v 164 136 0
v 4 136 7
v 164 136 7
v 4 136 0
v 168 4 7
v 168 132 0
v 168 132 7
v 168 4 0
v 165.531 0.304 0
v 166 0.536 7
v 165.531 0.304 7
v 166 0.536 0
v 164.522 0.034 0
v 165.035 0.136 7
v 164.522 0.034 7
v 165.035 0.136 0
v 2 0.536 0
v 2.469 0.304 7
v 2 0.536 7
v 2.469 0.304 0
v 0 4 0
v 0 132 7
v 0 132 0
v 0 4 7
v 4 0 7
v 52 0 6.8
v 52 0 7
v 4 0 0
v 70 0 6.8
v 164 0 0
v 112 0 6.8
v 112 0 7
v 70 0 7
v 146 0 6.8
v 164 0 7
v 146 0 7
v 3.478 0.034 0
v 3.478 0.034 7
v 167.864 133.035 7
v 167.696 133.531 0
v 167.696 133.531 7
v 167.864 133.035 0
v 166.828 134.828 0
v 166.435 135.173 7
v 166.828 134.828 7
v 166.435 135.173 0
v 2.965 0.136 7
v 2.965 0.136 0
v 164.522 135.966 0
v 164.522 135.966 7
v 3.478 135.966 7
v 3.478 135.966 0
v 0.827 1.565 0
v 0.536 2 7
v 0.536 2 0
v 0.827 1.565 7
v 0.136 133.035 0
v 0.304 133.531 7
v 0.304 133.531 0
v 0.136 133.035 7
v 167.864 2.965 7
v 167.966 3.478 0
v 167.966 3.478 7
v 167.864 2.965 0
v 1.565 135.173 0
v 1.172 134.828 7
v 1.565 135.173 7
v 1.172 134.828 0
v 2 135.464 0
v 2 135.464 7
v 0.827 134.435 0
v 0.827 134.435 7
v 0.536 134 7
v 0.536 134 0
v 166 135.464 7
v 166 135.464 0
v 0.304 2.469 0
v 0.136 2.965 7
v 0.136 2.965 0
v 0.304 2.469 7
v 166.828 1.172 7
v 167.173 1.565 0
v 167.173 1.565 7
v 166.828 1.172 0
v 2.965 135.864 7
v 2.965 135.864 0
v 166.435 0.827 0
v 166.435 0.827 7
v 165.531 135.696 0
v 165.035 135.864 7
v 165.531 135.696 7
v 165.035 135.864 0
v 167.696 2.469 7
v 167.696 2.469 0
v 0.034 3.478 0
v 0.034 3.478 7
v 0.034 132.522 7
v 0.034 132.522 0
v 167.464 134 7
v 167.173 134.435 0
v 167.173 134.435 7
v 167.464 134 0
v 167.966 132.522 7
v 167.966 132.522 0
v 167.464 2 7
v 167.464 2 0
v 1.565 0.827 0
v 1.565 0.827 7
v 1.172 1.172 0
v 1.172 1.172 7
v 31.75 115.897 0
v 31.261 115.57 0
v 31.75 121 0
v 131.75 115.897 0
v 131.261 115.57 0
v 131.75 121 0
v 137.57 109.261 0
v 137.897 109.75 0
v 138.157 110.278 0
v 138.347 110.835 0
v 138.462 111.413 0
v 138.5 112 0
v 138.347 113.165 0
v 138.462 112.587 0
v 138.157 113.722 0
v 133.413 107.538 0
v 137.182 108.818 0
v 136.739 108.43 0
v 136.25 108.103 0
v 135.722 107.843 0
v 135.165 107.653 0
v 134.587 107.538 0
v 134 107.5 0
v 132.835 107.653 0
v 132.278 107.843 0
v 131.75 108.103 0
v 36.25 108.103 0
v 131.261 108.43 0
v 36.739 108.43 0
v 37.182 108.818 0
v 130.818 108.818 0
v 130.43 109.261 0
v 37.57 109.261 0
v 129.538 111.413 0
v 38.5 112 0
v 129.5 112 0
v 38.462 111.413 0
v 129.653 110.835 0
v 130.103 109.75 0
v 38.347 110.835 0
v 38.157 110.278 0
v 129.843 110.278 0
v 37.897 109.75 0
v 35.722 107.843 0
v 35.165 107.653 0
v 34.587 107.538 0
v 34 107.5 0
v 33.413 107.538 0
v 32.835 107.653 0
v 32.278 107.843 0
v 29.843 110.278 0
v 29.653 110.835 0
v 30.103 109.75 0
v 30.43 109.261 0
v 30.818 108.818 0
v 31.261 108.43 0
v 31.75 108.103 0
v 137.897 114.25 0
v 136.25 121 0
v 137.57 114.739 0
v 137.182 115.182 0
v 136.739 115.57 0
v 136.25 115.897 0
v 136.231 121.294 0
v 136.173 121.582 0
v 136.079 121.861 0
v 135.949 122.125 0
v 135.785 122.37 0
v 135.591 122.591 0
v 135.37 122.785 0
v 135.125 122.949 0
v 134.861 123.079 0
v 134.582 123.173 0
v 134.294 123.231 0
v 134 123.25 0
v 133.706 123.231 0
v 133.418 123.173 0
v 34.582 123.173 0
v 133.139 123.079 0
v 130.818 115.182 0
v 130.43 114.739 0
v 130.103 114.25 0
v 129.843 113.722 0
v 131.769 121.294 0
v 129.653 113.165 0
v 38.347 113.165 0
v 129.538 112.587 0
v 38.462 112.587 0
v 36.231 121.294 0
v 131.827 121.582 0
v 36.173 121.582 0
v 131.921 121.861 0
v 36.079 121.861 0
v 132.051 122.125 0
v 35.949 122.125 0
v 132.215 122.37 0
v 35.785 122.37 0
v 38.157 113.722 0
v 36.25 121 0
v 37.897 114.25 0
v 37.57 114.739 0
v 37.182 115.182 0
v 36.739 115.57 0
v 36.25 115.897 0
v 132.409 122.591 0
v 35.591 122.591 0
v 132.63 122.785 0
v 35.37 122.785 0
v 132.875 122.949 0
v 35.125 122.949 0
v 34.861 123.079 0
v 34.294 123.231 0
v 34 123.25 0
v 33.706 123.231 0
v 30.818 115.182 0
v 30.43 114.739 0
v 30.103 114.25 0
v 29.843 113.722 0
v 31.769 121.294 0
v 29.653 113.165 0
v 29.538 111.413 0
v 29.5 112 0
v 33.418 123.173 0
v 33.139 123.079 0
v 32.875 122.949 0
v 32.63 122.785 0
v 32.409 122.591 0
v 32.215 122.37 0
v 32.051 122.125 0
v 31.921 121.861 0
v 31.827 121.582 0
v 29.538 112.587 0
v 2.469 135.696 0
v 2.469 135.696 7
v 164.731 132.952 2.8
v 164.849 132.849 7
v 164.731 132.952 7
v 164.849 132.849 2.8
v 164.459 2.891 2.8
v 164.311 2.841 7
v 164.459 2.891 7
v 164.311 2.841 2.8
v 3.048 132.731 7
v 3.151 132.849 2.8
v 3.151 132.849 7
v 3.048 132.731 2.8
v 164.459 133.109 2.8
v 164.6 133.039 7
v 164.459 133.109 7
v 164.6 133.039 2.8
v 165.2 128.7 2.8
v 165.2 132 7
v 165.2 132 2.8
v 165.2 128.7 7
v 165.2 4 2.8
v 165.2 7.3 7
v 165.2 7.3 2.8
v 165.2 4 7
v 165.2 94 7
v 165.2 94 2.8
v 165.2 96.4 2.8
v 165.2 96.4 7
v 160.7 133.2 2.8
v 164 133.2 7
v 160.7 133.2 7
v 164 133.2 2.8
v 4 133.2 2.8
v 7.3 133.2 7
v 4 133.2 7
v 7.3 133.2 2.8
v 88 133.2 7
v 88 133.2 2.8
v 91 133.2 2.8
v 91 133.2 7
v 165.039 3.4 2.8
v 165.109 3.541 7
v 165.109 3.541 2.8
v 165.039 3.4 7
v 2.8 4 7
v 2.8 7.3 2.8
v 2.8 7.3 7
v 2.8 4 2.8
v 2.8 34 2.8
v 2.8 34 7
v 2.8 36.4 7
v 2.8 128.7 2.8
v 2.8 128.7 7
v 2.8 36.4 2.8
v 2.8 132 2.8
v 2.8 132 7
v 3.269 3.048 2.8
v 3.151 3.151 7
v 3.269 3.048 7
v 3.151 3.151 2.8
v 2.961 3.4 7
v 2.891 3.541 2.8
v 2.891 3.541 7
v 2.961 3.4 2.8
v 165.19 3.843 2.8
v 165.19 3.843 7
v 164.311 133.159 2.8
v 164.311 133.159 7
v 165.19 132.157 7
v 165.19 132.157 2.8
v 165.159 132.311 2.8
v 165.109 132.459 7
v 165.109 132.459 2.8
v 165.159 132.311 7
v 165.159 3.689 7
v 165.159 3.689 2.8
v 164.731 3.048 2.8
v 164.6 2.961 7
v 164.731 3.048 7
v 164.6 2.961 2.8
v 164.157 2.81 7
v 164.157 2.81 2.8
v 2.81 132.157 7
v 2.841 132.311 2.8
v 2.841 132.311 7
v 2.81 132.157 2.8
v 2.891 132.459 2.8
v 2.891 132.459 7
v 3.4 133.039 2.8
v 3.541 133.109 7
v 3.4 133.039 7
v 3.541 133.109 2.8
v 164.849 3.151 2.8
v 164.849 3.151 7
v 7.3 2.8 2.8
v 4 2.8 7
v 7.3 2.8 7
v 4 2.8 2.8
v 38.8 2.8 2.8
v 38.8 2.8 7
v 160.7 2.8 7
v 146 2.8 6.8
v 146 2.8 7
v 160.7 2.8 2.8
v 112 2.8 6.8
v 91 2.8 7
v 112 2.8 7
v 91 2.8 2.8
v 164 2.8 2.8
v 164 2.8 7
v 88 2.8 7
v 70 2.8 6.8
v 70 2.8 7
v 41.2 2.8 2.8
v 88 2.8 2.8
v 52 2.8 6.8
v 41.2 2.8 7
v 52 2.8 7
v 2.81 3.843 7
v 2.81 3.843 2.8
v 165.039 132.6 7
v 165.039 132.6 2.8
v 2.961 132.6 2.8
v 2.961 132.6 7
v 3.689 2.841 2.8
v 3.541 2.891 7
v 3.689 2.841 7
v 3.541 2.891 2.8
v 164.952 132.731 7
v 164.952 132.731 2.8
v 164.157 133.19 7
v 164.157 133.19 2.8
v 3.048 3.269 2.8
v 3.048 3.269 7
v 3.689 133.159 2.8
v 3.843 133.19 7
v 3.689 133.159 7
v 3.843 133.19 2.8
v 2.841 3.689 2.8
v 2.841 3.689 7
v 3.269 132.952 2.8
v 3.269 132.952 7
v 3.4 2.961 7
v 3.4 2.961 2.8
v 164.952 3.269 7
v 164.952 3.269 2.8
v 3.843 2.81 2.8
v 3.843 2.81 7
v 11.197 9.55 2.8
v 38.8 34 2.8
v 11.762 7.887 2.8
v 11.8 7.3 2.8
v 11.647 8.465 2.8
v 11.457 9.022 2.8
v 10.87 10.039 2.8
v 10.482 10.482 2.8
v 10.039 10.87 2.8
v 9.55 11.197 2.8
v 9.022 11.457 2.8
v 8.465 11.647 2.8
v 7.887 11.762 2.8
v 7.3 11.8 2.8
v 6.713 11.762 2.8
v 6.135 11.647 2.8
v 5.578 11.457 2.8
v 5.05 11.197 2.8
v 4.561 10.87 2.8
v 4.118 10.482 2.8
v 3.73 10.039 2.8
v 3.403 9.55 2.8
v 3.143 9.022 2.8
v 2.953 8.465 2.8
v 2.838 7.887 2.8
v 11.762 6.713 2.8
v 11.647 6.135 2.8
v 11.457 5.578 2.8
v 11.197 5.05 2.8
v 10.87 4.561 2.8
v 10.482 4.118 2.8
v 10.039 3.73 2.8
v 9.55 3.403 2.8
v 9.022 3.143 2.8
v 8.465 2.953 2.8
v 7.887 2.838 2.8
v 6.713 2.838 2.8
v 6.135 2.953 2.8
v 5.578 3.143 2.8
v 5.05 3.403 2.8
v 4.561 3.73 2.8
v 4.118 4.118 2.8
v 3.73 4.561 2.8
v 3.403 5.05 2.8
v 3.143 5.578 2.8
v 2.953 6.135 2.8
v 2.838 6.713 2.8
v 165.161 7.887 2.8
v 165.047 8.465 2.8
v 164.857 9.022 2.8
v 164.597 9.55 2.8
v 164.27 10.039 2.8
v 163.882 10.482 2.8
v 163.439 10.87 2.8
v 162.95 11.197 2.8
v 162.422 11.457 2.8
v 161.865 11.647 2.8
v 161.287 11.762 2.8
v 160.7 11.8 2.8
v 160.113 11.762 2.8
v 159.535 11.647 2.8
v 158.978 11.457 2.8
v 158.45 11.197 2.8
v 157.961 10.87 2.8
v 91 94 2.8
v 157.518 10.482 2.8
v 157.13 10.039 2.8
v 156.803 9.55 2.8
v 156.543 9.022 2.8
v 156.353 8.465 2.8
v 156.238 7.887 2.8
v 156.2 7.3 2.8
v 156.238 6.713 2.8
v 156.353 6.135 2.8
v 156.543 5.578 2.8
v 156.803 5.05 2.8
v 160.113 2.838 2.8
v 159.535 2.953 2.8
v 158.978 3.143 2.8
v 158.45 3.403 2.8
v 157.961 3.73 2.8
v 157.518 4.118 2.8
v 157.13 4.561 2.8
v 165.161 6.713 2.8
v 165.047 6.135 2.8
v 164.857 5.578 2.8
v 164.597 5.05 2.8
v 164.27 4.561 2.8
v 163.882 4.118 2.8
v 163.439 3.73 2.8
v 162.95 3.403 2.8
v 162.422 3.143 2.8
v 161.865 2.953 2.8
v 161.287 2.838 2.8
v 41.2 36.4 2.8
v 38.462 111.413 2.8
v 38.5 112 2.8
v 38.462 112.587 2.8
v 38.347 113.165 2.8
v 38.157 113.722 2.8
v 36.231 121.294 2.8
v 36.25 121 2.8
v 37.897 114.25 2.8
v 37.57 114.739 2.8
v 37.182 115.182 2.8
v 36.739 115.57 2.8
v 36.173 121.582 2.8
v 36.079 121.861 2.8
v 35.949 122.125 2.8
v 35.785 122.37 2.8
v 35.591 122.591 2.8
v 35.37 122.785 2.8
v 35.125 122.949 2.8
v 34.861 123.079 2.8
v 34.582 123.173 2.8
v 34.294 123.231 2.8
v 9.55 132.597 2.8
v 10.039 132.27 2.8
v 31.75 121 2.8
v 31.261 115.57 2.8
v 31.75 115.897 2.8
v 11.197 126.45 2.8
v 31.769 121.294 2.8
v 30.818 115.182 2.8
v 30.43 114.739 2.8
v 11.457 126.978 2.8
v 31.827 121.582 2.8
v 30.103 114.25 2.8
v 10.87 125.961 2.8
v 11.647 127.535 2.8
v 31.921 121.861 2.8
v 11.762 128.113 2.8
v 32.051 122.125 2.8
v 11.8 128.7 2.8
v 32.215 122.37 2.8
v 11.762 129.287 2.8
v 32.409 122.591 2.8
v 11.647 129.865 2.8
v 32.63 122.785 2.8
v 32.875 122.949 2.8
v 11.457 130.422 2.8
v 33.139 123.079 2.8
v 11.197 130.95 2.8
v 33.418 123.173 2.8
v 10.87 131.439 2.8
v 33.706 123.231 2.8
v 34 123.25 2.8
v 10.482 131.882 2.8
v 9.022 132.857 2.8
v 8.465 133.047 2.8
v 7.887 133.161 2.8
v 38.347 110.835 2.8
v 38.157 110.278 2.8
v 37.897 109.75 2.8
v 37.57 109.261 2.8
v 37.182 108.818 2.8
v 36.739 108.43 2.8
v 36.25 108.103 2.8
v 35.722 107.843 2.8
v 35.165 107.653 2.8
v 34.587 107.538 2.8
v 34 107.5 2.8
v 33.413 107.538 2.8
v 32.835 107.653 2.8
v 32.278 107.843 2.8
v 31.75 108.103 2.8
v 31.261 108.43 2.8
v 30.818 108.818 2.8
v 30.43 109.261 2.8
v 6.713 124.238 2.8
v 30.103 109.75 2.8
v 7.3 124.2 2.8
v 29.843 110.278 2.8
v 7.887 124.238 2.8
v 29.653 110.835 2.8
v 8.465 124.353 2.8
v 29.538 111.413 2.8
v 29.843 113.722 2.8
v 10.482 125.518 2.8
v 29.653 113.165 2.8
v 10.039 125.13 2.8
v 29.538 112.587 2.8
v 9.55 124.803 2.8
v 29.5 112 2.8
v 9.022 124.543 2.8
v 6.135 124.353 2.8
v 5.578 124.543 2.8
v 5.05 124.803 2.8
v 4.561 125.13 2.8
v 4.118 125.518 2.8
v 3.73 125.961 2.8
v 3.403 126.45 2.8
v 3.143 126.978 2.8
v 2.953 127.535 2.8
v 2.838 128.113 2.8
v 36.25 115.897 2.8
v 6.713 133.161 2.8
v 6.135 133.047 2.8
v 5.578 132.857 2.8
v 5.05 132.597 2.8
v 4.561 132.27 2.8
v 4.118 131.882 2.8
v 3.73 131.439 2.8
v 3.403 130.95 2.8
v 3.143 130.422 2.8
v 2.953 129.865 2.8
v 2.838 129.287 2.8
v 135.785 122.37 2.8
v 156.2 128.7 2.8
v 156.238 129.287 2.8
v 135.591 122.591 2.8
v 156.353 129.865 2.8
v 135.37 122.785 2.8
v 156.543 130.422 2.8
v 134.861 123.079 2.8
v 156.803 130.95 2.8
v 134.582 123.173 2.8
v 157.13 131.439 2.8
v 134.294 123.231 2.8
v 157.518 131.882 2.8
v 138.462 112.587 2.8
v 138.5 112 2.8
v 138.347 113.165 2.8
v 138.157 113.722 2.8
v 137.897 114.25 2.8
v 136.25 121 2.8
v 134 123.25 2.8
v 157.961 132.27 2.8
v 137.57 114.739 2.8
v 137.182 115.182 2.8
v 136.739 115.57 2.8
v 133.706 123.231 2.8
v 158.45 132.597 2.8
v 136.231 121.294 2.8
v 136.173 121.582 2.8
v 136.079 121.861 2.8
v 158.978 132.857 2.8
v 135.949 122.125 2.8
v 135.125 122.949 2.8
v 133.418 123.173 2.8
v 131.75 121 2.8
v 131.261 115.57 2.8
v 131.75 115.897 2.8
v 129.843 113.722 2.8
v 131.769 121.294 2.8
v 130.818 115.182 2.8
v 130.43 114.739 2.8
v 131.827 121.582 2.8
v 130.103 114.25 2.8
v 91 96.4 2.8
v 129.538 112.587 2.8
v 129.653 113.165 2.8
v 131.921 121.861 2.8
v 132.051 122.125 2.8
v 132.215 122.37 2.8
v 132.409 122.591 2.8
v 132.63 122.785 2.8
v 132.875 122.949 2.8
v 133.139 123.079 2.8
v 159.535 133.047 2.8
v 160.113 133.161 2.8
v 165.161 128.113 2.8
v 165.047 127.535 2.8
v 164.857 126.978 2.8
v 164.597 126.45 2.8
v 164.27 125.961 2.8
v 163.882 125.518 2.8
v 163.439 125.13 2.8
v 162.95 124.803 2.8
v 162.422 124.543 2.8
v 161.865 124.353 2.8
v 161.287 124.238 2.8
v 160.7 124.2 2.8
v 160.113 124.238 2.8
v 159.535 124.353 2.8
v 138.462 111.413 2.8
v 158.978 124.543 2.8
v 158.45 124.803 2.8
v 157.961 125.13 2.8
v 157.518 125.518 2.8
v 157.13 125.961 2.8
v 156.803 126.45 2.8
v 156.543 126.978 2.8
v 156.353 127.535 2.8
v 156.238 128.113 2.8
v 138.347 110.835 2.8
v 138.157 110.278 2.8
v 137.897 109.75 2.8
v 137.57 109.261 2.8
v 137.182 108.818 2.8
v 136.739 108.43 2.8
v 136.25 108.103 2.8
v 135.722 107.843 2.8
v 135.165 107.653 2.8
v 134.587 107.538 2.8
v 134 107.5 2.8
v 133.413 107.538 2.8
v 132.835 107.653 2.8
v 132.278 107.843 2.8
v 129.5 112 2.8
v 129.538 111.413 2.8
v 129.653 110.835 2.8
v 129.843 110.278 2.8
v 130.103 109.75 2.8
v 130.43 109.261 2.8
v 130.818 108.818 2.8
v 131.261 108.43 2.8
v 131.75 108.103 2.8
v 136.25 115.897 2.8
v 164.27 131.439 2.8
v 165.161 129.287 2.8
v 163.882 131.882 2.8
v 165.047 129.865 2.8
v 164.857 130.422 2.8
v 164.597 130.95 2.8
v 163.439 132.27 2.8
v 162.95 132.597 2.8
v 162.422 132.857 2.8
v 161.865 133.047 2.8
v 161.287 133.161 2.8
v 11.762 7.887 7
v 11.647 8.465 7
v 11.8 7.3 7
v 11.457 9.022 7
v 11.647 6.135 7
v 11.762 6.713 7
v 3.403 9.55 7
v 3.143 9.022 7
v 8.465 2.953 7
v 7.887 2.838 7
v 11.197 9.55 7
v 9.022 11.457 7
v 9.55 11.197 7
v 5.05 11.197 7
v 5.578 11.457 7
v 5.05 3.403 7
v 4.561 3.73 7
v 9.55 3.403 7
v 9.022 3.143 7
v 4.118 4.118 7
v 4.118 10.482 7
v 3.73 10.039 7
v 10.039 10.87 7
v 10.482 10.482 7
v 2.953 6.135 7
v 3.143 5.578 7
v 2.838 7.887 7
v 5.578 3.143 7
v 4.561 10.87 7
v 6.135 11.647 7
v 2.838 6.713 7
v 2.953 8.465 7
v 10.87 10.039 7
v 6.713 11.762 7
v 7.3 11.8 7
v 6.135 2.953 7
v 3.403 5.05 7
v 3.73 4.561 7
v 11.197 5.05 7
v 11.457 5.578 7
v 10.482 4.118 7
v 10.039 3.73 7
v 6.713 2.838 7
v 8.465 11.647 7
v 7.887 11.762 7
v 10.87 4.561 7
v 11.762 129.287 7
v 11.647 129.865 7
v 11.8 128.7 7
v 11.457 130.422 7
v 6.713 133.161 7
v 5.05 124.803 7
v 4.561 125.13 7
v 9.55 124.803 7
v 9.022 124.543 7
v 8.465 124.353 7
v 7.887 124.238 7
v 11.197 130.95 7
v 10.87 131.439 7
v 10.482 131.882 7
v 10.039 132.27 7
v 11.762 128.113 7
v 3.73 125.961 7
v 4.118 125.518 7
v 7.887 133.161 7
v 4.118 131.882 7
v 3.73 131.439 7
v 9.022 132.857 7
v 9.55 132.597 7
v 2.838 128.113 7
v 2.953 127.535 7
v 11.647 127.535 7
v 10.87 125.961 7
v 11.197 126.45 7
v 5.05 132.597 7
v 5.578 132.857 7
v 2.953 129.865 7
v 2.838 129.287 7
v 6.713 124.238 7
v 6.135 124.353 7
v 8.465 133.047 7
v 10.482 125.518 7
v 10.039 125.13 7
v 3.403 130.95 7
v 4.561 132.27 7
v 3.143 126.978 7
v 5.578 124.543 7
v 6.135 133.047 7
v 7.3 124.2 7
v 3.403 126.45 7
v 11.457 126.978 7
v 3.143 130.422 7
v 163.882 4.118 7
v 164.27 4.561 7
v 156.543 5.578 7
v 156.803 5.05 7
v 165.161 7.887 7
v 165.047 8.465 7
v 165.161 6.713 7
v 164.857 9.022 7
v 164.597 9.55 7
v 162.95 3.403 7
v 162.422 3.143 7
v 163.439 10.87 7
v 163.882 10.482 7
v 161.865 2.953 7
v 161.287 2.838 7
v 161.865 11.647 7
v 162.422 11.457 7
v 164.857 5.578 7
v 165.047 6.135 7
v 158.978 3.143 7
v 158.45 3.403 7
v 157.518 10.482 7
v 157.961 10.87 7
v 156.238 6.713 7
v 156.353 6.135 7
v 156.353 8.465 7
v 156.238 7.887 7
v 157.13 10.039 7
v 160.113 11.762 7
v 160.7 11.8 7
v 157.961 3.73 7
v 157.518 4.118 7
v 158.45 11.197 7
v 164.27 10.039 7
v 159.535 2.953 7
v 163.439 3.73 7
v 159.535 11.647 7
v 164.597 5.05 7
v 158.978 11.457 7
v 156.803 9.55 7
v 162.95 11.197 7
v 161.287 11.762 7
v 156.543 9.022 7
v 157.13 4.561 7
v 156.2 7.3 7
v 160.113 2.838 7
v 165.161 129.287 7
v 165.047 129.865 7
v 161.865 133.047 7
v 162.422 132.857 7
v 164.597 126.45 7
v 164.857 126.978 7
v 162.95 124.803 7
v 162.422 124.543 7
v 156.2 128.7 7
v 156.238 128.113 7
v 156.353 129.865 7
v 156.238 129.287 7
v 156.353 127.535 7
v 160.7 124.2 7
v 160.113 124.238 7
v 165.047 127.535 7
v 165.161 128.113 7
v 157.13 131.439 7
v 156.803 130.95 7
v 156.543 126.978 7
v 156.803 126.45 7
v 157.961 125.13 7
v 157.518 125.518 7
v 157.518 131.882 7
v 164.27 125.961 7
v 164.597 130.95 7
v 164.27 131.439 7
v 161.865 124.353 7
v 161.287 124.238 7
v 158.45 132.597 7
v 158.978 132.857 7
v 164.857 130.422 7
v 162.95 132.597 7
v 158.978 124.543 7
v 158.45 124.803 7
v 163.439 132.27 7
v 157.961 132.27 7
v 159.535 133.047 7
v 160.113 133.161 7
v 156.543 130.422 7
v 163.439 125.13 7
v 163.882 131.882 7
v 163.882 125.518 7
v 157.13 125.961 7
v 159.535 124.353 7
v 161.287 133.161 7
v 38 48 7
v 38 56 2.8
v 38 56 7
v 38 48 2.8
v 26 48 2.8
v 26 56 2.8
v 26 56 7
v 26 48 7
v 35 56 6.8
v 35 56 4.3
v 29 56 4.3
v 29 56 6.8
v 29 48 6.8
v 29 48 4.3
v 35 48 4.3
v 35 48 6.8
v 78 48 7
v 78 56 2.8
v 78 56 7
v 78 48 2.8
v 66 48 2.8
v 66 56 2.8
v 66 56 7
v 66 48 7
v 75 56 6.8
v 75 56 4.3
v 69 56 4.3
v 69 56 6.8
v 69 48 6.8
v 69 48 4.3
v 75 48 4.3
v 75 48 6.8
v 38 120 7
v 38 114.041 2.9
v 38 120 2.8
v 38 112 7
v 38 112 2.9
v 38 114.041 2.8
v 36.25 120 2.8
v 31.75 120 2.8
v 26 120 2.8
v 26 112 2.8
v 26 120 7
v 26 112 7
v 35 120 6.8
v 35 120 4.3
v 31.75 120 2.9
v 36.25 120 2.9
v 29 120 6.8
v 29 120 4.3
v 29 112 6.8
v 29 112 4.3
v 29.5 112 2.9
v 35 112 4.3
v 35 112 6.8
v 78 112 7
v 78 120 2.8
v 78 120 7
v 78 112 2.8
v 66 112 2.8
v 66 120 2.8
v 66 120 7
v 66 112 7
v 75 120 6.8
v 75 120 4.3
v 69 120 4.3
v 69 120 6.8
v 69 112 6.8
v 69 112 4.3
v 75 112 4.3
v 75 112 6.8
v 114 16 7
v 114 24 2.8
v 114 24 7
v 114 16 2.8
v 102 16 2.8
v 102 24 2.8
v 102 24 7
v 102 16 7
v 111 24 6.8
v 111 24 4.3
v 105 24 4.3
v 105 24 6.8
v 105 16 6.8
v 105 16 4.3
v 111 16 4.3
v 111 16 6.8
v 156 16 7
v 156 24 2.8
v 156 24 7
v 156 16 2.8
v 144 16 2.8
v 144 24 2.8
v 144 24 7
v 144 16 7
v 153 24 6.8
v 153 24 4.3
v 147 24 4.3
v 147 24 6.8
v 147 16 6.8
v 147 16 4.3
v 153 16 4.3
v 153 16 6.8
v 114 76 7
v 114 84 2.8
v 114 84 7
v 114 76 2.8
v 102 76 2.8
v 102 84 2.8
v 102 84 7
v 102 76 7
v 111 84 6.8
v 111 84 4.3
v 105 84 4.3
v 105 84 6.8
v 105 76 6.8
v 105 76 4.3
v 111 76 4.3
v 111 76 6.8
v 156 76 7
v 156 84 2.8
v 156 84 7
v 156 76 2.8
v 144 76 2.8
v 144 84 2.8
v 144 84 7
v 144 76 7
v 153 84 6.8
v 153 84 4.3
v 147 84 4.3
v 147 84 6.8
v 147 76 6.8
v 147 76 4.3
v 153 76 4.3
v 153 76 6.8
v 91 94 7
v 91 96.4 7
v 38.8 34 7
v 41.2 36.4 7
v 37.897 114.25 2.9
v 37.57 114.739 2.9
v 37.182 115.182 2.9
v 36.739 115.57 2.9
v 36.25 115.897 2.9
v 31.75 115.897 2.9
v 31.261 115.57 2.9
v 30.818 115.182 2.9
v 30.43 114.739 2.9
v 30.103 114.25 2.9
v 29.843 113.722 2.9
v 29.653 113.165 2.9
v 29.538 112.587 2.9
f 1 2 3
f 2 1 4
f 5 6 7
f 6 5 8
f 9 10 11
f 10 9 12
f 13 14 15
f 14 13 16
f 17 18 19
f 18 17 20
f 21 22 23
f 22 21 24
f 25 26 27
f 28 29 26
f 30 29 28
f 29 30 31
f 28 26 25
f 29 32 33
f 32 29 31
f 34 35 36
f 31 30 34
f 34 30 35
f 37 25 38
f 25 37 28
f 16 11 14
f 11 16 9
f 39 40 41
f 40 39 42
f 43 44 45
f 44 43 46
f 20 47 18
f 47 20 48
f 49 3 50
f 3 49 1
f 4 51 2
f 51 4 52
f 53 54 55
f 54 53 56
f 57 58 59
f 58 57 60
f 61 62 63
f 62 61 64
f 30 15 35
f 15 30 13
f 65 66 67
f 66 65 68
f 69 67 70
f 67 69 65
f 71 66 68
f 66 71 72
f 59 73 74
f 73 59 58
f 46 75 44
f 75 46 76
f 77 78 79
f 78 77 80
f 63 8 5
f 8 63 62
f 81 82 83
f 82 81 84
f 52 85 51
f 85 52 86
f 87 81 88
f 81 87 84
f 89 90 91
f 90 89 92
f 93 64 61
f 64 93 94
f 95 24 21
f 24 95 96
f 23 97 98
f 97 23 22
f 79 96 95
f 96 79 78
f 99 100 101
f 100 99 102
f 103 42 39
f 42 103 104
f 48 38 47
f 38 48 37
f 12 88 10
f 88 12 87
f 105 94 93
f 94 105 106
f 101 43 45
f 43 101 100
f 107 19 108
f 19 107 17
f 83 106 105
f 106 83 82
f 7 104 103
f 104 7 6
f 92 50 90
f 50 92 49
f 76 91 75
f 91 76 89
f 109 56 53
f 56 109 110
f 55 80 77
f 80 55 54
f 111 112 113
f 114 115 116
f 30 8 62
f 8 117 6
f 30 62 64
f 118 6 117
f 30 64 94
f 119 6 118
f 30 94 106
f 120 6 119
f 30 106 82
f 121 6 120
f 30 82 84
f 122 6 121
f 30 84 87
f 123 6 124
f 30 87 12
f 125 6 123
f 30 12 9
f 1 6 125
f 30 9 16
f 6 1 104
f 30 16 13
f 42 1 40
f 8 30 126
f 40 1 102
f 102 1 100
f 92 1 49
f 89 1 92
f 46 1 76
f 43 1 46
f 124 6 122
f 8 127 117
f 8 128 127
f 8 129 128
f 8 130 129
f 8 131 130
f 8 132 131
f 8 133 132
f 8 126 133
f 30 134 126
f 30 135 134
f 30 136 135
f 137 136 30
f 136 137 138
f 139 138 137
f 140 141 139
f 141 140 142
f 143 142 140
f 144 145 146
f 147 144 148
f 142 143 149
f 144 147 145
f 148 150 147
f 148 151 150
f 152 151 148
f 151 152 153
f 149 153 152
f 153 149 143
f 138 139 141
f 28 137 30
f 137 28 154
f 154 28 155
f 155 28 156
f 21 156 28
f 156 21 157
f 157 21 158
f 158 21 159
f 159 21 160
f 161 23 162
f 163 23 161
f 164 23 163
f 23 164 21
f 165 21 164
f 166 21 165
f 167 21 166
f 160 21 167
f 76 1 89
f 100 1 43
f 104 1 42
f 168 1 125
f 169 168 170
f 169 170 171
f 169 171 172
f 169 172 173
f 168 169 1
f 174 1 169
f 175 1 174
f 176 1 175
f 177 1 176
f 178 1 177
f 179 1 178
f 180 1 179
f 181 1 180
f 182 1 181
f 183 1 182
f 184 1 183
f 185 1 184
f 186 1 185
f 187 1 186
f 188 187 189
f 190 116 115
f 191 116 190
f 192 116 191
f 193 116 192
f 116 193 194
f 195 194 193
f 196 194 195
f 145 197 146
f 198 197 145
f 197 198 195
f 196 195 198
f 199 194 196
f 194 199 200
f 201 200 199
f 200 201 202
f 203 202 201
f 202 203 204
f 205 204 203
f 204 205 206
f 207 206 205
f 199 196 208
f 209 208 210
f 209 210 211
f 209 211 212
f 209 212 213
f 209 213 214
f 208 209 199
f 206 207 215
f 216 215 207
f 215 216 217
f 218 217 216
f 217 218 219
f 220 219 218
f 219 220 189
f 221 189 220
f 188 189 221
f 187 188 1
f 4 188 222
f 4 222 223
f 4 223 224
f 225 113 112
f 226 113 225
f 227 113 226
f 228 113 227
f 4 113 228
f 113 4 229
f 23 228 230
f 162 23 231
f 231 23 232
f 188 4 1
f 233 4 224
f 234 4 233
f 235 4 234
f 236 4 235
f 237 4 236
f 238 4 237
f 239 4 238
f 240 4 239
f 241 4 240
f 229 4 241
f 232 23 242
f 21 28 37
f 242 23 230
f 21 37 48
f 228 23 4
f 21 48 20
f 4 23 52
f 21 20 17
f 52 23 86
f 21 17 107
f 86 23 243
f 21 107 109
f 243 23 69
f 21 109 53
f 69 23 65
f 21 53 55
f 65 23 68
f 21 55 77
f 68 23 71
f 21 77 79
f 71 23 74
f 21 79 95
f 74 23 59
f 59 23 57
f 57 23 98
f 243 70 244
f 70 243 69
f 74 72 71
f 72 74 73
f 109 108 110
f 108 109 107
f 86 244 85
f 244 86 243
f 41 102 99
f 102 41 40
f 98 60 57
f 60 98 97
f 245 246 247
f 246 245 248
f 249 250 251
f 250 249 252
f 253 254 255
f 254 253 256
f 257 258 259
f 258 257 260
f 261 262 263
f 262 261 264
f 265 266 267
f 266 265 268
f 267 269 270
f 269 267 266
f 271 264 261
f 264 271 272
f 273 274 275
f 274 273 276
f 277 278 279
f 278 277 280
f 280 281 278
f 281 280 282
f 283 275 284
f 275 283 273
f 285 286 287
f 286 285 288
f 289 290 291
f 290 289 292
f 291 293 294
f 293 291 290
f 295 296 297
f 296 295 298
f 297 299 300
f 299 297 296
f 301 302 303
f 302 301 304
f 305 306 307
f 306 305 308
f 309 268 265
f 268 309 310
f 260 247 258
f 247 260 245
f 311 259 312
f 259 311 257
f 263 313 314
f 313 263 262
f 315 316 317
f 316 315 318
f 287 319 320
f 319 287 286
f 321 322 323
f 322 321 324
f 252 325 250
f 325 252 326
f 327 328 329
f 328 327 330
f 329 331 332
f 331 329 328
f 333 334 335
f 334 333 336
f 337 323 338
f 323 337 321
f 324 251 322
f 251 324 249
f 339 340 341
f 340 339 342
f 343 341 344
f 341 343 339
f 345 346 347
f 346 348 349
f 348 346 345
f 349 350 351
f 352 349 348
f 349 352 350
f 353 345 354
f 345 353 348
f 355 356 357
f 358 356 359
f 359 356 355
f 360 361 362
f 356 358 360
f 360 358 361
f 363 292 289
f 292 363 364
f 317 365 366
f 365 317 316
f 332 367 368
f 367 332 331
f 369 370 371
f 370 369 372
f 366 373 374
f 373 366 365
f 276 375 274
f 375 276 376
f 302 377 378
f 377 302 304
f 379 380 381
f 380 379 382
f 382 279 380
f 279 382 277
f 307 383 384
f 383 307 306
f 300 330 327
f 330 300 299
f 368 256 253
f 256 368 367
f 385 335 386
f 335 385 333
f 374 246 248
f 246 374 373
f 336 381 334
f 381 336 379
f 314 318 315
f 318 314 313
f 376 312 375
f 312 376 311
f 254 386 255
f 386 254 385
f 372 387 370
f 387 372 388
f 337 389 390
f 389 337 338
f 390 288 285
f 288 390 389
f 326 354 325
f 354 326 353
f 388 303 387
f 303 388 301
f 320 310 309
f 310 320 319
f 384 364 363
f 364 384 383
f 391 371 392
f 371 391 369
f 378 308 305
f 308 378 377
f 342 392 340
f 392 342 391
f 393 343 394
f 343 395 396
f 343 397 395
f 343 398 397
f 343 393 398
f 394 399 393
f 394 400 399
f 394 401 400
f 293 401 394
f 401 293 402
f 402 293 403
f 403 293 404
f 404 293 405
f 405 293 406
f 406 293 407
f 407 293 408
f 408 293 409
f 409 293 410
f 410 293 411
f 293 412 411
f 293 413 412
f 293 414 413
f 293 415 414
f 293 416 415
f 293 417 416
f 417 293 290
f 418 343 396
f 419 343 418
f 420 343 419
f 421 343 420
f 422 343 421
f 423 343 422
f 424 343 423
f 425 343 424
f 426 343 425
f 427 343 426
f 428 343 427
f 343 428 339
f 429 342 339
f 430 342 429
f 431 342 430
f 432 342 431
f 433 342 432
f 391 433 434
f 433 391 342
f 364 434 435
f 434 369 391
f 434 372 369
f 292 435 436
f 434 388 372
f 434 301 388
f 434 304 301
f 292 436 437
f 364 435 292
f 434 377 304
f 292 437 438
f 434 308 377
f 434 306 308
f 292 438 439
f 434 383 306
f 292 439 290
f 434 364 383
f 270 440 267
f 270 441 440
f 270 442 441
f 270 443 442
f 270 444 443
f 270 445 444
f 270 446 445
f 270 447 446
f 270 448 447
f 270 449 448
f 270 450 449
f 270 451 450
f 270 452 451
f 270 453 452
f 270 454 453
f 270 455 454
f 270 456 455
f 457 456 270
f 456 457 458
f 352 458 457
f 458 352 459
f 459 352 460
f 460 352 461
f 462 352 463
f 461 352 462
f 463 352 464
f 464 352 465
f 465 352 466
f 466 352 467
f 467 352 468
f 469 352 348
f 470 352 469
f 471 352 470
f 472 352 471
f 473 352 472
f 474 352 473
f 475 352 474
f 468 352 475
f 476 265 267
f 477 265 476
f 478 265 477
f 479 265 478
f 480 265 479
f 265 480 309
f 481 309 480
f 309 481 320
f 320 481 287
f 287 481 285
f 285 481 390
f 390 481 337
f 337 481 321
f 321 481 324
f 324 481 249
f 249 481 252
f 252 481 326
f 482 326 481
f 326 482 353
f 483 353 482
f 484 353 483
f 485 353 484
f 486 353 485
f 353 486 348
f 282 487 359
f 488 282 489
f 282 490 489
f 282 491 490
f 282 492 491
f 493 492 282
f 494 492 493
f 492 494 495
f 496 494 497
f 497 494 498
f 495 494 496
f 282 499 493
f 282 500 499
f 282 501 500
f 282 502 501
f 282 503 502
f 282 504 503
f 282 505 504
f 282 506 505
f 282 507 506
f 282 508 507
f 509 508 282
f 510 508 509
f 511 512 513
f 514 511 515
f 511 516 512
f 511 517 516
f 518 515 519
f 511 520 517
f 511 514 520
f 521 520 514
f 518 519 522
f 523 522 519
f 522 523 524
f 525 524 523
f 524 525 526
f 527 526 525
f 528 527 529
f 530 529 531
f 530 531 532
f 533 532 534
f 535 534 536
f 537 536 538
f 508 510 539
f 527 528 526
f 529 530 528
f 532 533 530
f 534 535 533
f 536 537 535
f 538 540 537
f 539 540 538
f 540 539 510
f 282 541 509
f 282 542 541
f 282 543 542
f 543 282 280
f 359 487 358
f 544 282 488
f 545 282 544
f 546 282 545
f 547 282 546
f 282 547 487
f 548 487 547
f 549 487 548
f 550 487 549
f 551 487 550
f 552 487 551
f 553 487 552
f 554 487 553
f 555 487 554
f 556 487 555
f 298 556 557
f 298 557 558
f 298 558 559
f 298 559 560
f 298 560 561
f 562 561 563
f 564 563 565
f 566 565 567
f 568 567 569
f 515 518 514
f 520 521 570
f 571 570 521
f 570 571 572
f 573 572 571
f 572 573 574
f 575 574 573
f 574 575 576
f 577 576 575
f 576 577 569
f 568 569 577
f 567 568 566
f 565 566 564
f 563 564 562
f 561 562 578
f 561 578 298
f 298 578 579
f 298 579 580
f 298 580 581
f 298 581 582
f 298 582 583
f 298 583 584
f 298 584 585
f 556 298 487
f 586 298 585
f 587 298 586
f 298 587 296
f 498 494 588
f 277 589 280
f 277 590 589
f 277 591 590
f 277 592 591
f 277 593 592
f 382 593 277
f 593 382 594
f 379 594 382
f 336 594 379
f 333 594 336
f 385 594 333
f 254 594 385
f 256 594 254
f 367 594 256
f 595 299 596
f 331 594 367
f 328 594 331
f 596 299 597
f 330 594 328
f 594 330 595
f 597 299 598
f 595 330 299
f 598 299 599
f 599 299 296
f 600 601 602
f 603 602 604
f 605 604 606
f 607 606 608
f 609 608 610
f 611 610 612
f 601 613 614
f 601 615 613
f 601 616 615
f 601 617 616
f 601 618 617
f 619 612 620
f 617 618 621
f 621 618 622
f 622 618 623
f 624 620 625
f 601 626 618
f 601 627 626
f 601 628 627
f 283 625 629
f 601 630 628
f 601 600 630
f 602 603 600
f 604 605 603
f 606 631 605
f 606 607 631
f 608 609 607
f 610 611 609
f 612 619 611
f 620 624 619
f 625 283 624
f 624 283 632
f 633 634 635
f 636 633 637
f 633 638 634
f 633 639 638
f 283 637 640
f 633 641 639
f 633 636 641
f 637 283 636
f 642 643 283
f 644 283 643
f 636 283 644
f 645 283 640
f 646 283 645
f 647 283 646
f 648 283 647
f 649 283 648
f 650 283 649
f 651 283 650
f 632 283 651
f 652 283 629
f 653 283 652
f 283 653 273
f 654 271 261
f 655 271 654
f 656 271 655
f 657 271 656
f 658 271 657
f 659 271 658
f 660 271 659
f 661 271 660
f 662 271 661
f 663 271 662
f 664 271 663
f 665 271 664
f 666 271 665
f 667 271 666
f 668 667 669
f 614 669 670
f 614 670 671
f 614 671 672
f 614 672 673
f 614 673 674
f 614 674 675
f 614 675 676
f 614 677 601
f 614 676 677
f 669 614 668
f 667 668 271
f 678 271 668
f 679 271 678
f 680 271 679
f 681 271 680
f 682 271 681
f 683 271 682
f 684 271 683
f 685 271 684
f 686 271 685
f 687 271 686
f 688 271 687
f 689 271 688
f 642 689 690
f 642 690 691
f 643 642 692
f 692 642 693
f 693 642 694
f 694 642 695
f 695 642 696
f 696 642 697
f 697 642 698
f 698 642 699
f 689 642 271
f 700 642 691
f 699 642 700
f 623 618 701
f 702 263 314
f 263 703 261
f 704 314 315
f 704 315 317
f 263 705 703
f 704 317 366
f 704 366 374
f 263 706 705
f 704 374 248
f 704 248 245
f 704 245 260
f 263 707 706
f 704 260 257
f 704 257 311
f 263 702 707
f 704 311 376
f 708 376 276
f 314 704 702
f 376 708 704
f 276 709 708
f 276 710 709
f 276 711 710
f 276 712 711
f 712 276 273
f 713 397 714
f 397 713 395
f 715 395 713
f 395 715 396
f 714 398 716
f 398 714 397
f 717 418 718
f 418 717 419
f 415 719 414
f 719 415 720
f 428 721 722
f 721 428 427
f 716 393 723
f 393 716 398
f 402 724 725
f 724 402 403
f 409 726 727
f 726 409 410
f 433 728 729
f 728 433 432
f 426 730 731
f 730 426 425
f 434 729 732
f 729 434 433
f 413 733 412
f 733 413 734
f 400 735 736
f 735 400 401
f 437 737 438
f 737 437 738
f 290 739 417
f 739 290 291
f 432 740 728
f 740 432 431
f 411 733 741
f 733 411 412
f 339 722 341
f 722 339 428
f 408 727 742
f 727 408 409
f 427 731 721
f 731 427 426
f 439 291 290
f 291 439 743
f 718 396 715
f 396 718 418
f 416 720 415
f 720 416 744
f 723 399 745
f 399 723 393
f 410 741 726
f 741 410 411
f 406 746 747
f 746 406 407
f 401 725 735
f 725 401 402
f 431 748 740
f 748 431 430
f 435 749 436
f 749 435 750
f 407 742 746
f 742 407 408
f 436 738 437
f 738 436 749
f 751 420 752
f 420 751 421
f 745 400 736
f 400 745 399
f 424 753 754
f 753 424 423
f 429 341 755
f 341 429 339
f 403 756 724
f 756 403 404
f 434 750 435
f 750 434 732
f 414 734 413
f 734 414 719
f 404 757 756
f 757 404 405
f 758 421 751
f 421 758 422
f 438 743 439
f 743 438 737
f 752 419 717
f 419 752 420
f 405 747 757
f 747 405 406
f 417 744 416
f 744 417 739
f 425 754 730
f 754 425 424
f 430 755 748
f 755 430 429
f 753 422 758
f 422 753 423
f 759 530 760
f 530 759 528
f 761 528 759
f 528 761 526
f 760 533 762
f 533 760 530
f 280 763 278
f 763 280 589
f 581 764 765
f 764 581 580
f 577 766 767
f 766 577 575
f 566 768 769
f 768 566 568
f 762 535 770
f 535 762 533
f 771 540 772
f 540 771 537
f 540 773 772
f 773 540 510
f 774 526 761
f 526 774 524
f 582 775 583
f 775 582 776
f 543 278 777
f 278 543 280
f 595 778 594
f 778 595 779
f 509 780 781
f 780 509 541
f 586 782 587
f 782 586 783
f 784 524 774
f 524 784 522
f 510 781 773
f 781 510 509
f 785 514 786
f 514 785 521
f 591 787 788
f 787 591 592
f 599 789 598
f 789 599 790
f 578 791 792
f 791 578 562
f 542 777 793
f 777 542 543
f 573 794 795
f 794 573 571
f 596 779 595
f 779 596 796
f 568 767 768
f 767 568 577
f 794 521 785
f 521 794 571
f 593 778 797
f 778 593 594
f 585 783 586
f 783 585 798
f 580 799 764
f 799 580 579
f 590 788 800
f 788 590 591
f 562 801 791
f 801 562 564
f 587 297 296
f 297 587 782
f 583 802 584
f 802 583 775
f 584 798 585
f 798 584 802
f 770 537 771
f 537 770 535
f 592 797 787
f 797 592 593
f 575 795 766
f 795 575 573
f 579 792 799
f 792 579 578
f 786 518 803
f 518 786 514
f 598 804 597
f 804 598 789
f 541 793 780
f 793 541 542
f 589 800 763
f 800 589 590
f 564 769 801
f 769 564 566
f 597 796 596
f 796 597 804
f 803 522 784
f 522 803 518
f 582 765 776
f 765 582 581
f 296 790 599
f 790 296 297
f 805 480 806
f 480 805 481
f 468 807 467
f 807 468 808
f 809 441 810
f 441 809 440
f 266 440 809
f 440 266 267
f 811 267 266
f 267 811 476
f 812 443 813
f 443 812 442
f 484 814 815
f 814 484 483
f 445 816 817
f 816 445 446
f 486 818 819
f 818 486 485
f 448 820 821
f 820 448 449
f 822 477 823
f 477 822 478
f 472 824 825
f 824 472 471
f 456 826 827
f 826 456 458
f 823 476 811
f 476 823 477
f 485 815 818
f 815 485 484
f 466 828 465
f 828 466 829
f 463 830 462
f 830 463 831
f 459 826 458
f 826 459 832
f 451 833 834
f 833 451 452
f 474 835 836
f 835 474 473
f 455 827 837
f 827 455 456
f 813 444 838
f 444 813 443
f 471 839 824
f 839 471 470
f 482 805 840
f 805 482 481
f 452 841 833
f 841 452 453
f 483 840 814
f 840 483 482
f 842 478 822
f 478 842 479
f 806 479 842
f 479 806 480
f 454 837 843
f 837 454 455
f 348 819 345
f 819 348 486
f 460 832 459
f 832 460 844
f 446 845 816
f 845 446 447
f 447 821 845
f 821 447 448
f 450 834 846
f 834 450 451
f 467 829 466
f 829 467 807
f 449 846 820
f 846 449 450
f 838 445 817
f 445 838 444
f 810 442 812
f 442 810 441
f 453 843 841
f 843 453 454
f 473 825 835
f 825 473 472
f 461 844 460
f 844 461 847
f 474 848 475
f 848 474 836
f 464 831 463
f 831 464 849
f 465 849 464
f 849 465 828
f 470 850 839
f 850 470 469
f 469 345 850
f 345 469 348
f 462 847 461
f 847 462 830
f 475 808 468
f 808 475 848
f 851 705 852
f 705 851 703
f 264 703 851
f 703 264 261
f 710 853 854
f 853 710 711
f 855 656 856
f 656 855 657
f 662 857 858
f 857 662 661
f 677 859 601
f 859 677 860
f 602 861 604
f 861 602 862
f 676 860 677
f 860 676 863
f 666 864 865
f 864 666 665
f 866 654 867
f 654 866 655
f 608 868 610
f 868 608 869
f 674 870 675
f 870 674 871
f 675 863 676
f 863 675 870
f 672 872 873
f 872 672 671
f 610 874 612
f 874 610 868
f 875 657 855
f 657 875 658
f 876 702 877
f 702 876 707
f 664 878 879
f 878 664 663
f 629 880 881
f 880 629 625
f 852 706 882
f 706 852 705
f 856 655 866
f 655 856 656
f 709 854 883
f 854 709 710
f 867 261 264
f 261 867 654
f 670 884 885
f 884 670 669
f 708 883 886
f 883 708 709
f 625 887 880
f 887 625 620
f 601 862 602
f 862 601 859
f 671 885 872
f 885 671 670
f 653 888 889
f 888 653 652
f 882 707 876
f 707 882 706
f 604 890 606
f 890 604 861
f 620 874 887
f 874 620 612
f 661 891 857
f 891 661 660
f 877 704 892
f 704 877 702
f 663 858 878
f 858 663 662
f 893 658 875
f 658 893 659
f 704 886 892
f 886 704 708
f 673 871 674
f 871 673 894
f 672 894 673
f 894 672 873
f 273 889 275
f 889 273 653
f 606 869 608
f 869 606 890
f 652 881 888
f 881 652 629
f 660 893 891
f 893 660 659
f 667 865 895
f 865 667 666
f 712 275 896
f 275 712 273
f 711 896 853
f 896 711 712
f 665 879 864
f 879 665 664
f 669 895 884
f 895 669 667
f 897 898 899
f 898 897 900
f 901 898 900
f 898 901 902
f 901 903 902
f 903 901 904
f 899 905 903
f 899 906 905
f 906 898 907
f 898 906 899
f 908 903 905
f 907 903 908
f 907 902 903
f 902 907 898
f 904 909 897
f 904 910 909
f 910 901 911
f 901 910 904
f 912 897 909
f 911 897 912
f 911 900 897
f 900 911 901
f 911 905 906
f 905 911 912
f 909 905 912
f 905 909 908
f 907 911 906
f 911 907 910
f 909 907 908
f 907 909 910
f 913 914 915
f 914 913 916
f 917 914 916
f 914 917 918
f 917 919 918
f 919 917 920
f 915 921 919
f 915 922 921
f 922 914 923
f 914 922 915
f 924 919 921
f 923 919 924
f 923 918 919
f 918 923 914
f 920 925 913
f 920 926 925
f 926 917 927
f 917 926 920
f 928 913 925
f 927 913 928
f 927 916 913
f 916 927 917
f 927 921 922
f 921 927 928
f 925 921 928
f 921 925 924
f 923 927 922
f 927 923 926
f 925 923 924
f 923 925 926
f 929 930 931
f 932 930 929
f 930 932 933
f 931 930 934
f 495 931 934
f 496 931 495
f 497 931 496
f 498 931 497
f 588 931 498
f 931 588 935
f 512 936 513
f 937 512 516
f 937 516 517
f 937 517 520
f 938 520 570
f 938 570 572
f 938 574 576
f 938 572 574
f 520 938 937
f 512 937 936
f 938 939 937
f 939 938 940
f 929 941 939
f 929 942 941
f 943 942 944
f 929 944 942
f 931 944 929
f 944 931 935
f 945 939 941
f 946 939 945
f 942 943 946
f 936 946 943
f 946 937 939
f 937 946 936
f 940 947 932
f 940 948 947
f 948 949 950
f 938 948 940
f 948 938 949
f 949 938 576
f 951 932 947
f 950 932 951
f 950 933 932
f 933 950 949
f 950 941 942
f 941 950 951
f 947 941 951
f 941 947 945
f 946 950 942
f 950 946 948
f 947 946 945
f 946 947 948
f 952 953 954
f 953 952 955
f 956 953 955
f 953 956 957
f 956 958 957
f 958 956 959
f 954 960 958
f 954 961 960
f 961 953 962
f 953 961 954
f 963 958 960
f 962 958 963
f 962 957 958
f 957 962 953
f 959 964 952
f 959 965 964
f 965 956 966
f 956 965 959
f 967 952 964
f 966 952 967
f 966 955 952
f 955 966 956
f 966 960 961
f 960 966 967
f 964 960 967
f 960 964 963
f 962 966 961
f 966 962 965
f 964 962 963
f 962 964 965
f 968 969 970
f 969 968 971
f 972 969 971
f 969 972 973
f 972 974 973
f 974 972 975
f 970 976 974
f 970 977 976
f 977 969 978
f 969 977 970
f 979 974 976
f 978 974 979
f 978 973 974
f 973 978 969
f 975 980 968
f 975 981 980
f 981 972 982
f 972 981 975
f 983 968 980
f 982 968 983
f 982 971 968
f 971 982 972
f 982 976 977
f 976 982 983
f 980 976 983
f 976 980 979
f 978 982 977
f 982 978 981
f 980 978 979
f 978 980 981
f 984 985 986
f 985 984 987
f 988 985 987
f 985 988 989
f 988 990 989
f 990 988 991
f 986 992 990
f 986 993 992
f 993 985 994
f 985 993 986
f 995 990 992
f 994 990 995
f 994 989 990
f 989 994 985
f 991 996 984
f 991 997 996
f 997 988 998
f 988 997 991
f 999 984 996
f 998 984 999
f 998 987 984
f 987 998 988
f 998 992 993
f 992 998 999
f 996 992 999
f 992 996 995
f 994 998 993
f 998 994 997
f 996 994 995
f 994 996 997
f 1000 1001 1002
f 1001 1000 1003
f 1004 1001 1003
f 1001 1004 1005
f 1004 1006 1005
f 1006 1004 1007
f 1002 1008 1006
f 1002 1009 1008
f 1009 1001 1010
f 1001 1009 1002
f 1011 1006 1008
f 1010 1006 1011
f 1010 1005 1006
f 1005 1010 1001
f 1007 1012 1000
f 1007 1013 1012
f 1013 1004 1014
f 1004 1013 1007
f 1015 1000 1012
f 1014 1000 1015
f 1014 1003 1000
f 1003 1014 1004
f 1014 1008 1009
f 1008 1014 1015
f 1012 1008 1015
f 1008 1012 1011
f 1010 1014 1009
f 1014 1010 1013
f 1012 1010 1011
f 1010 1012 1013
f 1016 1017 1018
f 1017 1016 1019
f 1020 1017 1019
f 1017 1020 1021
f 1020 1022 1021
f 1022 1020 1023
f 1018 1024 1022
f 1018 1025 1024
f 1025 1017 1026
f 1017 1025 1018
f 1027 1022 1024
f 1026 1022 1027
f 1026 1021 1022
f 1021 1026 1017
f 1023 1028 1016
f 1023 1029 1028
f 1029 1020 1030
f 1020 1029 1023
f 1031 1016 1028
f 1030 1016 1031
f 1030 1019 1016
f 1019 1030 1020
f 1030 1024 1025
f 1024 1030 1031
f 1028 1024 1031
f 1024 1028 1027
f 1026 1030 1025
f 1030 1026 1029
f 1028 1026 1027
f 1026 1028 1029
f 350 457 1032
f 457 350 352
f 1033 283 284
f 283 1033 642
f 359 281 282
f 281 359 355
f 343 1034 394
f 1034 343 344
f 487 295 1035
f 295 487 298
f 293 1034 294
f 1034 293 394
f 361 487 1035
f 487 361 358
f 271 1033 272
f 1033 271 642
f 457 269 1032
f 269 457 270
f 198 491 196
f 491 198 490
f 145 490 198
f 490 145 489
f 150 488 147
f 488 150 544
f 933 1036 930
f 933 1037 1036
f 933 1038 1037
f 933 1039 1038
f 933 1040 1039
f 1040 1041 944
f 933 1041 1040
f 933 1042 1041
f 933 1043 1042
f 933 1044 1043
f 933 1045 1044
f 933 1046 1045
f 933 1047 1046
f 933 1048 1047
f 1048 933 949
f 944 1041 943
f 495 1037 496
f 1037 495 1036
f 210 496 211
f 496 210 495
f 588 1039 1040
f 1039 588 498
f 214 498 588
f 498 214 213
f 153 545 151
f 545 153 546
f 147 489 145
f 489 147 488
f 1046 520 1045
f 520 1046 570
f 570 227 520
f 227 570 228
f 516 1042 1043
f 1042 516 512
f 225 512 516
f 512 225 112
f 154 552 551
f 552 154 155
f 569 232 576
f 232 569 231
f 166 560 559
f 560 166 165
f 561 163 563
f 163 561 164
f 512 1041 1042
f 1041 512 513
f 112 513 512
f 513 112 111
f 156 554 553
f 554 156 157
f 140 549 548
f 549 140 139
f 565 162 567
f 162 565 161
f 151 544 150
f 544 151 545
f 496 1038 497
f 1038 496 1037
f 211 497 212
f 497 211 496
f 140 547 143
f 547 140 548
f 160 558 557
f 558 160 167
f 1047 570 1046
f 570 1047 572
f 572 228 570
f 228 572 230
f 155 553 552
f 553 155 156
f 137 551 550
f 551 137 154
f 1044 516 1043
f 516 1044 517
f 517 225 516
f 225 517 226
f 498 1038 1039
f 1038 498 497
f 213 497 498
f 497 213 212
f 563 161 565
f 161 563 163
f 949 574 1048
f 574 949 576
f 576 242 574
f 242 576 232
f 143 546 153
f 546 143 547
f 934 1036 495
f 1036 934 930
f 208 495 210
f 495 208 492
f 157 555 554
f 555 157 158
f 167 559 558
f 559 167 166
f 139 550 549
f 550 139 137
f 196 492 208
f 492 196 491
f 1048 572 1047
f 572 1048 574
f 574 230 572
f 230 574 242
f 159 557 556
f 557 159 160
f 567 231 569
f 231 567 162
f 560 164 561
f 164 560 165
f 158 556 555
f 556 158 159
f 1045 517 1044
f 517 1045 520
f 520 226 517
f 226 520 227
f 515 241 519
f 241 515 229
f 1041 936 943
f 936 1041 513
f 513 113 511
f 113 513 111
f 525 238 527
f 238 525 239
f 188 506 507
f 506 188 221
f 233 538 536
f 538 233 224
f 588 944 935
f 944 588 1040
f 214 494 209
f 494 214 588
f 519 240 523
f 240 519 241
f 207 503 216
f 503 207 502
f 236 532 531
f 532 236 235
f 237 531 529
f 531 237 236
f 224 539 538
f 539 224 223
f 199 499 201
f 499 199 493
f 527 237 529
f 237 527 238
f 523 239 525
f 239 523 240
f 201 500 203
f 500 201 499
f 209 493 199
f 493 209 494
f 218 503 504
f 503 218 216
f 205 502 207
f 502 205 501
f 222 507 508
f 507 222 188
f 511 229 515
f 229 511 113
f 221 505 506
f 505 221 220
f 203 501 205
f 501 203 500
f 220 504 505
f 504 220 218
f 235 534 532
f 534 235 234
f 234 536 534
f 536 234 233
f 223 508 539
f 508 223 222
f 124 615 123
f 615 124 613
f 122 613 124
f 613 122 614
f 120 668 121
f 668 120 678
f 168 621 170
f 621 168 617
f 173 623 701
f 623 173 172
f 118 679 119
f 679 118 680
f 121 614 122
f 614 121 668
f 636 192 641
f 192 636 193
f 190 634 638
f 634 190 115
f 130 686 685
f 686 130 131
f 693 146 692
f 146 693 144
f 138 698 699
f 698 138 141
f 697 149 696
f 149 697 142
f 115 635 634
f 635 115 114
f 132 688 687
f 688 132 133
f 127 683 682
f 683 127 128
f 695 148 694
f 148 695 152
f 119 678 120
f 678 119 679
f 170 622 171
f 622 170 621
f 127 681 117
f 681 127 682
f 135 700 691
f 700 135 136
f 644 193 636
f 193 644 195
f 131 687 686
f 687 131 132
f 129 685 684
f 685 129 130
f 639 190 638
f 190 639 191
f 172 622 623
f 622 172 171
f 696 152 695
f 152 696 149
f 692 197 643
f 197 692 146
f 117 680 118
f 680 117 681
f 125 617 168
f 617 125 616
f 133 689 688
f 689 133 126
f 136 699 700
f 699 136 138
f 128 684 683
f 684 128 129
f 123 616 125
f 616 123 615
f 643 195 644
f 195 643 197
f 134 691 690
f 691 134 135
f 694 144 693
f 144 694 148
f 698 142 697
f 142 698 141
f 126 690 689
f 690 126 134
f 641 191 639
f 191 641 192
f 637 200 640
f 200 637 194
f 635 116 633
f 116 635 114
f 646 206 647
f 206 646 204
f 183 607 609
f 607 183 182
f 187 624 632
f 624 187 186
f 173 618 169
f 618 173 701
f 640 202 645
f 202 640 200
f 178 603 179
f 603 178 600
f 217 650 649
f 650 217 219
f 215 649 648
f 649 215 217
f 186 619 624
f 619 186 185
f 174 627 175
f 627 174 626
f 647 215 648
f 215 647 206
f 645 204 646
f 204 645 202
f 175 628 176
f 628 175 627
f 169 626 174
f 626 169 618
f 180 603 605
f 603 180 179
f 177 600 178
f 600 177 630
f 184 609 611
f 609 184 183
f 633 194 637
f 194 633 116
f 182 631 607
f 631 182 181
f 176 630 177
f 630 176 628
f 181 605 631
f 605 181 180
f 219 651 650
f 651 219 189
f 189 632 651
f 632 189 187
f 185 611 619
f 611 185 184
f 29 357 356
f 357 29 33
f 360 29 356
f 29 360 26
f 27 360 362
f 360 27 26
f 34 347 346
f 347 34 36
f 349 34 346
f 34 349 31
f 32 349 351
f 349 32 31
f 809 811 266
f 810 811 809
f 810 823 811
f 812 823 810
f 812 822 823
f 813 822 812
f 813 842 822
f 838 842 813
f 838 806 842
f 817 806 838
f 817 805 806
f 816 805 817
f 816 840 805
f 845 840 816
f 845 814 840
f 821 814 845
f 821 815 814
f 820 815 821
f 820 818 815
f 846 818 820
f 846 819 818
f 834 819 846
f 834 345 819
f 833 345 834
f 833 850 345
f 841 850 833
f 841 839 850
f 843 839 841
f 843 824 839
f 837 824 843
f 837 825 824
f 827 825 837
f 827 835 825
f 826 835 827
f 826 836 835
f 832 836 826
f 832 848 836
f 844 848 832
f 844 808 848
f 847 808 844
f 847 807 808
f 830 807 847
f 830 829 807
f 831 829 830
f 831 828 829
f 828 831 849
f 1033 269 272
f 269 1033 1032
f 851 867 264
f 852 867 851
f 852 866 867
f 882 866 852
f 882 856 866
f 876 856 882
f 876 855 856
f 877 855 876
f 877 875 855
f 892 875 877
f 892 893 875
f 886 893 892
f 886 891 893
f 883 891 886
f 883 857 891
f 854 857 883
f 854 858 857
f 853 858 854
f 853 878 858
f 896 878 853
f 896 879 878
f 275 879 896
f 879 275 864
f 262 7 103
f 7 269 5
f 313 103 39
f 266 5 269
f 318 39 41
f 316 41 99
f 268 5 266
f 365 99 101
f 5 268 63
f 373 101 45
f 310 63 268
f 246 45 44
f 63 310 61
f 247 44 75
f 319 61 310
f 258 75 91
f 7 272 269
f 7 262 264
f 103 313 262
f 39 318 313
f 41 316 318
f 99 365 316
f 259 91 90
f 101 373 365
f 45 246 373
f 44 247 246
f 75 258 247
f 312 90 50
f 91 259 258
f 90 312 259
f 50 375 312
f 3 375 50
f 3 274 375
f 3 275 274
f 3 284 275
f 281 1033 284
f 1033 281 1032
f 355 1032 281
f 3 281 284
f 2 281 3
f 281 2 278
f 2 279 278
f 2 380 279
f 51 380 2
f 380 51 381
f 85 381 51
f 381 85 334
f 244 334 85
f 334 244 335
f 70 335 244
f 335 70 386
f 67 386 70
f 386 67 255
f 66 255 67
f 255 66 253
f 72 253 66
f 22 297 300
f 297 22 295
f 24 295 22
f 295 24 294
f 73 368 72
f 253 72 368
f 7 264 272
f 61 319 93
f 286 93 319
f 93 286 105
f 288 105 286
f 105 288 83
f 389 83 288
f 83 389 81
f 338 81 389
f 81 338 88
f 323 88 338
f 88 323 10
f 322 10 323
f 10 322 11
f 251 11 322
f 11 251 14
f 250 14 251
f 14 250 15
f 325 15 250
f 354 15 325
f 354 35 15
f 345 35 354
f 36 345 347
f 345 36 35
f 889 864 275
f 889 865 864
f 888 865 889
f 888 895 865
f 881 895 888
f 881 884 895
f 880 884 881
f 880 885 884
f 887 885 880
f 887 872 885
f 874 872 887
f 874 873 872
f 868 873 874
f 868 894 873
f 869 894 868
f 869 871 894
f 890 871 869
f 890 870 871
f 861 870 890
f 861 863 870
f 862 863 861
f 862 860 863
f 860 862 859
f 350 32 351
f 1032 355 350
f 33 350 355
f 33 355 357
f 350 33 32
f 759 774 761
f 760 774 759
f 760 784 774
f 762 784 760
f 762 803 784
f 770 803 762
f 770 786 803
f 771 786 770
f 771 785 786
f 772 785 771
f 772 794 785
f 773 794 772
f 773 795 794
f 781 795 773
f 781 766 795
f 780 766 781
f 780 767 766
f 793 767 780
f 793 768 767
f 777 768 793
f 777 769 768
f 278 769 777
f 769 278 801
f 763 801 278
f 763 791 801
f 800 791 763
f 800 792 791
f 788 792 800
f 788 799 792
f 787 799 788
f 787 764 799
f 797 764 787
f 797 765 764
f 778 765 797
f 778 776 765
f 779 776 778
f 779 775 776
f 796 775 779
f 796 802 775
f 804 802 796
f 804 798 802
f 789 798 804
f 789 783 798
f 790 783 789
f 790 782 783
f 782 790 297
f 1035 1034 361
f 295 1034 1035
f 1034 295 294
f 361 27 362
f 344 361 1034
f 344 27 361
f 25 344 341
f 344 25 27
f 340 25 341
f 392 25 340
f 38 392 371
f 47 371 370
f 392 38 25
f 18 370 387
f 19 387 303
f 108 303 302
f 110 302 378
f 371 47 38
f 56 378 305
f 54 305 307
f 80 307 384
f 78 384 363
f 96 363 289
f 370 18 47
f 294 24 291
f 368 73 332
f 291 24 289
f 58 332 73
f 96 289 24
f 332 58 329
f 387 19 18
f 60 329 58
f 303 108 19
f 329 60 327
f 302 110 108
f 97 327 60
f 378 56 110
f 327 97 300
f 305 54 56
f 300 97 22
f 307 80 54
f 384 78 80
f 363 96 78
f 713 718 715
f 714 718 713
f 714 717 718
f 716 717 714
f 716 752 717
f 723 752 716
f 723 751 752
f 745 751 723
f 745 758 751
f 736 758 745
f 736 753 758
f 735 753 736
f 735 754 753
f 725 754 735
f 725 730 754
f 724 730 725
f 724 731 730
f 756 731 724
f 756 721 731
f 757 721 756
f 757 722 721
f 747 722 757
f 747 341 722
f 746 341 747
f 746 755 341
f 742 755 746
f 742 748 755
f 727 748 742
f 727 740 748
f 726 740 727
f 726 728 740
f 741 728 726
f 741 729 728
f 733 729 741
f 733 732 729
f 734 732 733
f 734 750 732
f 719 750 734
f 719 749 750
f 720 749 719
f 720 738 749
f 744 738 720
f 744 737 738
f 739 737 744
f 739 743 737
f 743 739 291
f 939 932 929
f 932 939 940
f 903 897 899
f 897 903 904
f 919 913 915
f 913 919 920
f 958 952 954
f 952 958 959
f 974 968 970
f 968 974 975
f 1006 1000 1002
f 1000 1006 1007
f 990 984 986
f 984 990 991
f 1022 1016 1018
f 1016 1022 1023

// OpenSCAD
// Renders a 7mm bottom fit-check slice (prints in ~15-20 mins)
use <guava_home_enclosure.scad>;
test_slice();
